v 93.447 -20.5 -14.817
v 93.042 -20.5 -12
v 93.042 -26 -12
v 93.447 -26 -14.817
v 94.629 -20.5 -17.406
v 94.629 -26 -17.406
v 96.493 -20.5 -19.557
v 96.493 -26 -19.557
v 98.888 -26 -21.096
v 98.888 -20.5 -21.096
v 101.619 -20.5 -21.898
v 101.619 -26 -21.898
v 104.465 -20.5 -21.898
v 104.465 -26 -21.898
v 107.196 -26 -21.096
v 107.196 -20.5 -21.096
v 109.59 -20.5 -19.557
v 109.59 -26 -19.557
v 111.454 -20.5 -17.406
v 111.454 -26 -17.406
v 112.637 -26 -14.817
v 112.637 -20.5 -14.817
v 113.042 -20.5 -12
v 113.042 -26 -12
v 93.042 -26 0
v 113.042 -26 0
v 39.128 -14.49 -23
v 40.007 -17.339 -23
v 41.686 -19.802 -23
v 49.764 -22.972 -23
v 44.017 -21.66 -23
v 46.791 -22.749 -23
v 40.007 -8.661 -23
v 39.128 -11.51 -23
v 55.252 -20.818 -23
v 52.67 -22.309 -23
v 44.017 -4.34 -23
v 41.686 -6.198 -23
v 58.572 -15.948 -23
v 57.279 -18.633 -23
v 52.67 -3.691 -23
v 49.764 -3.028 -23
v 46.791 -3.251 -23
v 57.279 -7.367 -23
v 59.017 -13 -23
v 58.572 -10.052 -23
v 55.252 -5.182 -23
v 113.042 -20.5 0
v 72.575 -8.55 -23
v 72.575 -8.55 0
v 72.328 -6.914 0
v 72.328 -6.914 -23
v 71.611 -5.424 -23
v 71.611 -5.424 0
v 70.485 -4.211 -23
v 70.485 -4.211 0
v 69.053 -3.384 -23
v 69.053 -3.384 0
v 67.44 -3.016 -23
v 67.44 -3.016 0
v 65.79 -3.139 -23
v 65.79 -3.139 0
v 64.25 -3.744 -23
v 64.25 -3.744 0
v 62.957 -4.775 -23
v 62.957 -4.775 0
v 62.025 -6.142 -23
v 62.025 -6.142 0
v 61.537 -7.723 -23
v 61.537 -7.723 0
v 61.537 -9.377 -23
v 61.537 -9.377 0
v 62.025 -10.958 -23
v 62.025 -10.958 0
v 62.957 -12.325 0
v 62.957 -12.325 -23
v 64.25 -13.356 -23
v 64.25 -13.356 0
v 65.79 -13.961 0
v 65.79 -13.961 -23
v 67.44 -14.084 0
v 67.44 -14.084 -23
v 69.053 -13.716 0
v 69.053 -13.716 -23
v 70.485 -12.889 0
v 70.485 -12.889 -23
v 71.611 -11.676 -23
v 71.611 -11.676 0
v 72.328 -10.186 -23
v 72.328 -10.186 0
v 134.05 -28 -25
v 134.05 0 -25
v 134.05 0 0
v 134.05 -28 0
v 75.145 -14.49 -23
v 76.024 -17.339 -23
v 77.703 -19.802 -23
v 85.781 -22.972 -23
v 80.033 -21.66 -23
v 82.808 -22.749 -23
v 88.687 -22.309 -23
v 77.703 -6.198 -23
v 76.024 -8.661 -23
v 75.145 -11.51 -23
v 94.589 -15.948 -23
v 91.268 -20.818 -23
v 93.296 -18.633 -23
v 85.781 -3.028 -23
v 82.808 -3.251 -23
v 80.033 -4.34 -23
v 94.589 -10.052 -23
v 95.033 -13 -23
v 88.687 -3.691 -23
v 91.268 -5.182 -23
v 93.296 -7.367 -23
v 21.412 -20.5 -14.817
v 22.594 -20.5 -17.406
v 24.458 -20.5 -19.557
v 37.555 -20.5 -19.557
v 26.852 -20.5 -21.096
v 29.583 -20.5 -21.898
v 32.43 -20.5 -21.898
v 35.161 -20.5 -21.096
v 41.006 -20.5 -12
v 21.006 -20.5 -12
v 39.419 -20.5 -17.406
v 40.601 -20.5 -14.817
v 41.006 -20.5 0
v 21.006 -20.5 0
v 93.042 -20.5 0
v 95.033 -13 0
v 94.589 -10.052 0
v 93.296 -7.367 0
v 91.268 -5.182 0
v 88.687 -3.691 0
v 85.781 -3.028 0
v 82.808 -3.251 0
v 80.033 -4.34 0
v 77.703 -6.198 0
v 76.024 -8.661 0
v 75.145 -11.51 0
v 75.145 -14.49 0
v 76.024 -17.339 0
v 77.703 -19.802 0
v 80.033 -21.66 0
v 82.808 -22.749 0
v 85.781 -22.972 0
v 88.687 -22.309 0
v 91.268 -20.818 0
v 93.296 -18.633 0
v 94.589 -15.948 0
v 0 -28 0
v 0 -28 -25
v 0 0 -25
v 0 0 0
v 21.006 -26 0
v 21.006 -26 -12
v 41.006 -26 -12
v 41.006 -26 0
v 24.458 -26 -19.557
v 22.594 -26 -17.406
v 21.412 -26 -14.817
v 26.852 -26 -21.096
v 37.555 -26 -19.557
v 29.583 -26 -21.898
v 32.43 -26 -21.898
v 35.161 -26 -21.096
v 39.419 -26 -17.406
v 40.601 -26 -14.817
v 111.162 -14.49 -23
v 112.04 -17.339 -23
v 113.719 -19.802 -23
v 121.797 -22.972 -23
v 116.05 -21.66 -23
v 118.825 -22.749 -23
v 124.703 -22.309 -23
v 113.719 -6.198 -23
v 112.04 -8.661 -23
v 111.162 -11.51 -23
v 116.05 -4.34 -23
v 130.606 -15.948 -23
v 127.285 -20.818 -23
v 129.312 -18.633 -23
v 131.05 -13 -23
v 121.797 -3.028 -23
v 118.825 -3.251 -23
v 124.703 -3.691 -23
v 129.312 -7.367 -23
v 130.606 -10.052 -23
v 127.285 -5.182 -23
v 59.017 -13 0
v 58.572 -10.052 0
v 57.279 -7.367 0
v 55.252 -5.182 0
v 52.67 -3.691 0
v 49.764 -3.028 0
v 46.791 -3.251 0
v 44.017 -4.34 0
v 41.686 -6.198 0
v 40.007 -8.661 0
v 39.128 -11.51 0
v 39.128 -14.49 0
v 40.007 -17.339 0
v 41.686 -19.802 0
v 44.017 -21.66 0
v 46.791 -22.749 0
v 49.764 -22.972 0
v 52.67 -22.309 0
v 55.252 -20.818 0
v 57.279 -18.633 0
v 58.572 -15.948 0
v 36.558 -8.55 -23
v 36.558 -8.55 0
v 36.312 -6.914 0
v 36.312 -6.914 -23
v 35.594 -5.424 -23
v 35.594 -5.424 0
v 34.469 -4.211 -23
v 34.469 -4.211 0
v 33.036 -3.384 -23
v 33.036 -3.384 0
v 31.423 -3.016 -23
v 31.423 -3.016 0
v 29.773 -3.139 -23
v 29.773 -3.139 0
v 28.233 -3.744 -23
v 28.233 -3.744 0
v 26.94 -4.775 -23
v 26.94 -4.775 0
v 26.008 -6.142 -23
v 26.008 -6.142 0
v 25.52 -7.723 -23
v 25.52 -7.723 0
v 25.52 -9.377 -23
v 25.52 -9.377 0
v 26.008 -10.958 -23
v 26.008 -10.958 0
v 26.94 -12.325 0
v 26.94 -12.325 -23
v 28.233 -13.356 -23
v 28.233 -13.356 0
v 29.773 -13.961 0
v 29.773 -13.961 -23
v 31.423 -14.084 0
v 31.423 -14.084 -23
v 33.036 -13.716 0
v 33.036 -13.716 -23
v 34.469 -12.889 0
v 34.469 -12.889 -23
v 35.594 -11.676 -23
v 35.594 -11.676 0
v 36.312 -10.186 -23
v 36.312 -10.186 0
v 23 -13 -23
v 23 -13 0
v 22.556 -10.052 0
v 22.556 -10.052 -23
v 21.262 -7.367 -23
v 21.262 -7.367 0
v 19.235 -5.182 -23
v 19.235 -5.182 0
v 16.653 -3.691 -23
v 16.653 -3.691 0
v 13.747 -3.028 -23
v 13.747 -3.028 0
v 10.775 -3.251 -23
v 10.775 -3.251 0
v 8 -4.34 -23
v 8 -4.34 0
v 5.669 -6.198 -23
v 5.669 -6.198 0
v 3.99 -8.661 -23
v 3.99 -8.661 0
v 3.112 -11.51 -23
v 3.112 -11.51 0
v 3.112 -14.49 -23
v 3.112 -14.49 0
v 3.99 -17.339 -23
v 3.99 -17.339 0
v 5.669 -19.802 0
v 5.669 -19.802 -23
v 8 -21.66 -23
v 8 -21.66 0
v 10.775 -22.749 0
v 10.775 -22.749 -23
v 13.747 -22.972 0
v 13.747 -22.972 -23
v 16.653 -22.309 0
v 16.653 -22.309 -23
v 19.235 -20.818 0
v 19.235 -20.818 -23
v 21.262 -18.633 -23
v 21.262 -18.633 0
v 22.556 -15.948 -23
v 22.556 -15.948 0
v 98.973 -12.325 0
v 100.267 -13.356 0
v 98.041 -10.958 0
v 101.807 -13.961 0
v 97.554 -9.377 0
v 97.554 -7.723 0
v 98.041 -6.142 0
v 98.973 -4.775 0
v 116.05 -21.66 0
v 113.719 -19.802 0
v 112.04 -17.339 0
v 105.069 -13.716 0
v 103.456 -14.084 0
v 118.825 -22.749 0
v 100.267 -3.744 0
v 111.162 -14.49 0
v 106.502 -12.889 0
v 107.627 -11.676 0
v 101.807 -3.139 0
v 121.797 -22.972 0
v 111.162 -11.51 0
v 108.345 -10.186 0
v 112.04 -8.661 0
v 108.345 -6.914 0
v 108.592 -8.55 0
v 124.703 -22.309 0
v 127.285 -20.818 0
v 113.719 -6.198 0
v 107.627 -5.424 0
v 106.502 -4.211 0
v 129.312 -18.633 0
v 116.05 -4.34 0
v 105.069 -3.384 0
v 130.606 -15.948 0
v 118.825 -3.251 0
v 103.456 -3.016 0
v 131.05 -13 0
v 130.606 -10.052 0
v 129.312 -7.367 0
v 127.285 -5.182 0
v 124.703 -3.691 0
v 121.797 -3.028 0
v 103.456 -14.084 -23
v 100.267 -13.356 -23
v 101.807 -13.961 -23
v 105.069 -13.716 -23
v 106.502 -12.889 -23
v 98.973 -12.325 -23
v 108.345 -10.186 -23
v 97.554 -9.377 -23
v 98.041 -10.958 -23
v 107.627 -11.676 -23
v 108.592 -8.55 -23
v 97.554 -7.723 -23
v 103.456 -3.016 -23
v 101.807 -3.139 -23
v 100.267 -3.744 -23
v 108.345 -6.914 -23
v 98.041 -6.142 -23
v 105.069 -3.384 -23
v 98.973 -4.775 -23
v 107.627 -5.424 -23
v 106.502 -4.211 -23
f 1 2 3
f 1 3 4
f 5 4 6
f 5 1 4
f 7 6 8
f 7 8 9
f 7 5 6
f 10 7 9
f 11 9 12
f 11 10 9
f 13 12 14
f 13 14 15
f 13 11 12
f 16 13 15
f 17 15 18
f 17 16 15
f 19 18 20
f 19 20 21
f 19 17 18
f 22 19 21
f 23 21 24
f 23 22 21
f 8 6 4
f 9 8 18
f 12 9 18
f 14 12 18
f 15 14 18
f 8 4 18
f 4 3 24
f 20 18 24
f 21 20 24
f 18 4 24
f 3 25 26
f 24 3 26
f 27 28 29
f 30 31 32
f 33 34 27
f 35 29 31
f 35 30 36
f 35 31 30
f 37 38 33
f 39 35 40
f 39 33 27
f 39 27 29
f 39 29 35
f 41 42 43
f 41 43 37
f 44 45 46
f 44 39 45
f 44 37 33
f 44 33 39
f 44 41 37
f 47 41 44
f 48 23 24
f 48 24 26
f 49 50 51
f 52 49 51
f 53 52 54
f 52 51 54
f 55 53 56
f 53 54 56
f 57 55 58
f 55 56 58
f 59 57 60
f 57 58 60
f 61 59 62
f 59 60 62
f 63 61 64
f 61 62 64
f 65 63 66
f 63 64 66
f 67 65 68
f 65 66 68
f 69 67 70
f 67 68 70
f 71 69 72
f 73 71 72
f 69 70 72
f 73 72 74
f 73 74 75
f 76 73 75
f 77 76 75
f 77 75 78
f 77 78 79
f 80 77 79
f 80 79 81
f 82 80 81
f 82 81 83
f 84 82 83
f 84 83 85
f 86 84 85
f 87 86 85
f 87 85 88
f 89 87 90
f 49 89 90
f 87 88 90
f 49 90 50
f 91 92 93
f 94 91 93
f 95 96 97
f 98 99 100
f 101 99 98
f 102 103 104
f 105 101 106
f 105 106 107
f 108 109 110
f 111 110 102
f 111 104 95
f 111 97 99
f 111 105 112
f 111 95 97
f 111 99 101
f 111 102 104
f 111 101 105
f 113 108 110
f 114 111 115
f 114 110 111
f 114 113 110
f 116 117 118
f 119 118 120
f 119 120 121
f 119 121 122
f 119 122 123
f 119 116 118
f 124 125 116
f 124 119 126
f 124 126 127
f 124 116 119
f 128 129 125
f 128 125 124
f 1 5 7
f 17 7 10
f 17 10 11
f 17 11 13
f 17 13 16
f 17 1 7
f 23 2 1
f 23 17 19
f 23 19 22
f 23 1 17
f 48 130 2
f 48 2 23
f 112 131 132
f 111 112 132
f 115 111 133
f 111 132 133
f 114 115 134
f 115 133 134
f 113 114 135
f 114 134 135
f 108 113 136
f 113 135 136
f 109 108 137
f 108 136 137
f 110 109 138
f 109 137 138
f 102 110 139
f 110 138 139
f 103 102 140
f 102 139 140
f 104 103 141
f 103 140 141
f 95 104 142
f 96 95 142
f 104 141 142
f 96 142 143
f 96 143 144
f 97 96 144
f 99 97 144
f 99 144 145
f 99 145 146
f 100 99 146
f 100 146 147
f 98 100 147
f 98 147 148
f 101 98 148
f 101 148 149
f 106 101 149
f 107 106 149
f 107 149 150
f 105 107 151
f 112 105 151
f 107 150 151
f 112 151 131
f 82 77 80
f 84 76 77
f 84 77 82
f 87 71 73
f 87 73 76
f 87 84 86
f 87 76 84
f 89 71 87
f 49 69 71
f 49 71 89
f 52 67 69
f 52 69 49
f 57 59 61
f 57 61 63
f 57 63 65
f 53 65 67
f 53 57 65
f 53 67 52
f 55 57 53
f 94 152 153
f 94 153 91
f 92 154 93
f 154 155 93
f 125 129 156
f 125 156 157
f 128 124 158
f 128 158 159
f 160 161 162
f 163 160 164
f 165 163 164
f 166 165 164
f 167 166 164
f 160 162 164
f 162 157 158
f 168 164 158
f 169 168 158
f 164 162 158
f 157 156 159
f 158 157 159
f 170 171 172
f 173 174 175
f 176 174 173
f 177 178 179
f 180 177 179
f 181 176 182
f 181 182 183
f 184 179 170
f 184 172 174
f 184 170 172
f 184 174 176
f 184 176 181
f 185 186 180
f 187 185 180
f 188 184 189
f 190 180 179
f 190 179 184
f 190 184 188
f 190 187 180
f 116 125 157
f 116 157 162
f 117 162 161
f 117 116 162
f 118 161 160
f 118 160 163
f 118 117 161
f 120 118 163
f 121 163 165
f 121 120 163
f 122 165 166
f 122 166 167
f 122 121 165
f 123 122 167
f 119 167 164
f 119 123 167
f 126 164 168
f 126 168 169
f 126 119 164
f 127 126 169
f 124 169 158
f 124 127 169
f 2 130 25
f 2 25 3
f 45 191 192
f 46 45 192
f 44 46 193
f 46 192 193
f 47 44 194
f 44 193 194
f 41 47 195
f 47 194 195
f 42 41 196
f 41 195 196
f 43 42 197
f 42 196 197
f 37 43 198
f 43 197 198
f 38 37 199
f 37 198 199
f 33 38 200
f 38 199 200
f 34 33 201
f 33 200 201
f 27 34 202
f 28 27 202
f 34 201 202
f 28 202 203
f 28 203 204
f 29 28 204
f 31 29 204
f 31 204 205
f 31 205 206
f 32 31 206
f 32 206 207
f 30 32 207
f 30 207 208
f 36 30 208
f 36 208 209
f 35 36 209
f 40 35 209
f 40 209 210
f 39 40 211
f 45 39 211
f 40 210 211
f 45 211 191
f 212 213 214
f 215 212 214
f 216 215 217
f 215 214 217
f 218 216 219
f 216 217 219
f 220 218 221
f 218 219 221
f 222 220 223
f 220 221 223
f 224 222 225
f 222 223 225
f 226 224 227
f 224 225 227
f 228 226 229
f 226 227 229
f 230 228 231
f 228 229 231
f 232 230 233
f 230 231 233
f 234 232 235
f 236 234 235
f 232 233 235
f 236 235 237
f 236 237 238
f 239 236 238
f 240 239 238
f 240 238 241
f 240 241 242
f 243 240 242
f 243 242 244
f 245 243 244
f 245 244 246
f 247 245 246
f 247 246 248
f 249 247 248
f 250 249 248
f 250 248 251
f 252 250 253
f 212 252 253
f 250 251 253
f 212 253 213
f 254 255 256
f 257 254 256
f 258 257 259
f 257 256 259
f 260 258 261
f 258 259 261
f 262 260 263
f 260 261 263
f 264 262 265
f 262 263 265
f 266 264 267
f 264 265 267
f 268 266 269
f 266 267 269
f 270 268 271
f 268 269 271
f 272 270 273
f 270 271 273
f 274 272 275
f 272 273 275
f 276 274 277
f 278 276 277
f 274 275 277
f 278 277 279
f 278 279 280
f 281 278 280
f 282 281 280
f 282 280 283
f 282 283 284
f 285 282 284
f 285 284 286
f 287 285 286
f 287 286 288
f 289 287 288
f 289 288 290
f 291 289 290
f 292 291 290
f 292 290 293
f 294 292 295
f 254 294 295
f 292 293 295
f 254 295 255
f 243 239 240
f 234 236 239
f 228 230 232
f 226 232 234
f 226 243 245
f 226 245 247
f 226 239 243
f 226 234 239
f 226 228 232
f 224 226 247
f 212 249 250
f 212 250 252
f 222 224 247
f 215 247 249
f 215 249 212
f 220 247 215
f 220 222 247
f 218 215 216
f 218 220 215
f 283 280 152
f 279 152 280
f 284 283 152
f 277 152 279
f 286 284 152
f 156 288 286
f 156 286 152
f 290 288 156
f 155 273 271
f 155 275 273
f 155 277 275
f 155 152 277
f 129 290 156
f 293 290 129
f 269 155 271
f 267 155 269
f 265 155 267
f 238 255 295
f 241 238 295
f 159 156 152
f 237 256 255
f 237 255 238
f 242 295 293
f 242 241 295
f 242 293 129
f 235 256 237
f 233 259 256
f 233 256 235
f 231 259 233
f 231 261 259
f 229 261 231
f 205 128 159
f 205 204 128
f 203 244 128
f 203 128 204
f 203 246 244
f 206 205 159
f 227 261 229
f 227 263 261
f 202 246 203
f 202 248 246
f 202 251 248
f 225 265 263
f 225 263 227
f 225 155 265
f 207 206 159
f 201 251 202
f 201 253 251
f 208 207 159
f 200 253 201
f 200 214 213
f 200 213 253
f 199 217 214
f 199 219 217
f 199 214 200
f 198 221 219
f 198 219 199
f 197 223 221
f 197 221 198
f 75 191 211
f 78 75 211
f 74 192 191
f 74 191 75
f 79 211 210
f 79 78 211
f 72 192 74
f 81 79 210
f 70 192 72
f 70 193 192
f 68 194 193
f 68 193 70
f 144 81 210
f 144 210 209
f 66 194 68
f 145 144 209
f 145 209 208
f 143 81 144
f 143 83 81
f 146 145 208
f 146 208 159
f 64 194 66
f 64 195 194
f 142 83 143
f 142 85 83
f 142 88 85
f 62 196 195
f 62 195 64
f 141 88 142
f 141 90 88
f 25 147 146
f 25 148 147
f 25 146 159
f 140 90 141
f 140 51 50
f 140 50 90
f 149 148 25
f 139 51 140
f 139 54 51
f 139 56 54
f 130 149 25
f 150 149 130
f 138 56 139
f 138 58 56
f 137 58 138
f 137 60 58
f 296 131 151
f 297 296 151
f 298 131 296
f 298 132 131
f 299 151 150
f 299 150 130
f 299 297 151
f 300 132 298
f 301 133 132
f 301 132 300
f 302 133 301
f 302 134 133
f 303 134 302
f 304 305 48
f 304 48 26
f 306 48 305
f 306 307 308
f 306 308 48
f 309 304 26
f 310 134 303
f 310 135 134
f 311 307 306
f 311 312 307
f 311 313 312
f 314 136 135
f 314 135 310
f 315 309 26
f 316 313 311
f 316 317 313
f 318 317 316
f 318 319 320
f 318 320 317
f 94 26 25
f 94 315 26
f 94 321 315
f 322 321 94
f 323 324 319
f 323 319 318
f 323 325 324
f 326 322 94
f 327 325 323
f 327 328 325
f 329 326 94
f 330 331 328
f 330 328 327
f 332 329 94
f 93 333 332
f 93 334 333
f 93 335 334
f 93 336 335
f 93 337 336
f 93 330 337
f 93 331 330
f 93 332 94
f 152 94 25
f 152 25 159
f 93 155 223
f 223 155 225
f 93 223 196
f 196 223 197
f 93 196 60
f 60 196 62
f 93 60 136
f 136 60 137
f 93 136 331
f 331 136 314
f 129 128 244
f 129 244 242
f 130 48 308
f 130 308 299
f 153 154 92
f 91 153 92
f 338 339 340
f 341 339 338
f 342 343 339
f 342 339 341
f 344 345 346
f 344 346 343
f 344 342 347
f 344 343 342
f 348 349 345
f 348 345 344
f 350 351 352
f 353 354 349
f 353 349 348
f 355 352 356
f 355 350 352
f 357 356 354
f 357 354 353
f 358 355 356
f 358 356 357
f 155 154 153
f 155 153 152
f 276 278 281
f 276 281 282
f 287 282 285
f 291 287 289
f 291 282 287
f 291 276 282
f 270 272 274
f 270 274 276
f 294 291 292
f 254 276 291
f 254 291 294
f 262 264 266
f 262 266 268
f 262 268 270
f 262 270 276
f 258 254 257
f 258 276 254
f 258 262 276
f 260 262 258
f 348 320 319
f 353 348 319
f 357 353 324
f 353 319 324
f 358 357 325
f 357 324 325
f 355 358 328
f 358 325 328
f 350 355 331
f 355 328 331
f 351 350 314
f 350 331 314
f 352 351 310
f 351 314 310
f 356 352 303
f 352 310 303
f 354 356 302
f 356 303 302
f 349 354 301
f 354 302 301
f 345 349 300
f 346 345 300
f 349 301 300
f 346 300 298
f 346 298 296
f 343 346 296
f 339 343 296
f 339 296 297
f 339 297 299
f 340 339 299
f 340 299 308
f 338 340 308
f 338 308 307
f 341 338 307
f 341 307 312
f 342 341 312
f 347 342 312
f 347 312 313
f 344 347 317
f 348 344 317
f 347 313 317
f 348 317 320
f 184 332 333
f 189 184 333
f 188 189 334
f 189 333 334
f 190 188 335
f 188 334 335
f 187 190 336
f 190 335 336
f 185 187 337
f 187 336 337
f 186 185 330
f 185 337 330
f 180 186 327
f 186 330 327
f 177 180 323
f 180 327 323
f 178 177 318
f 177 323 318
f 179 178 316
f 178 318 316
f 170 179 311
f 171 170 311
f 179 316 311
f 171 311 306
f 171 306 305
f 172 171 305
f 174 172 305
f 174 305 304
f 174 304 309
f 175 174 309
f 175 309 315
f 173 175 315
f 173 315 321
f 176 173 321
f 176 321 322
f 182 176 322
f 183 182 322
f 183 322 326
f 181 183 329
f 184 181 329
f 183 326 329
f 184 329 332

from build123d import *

# Parameters (mm, degrees)
F0_W     = 134.0499884313
F0_H     = 28
F0_W_2   = 20
F0_H_2   = 5
F0_R     = 10
F0_R_2   = 5.55
F1_DEPTH = 23
F3_START = 20.5
F3_DEPTH = 5.5
F4_W     = 134.0499884313
F4_H     = 2
F5_DEPTH = 28


with BuildPart() as f1:
    # F0 (on Top) → F1 (new body)
    with BuildSketch(Plane.XY):
        with Locations((67.0249942156, -14)):
            Rectangle(F0_W, F0_H)
        with Locations((31.0064340452, -23.5)):
            Rectangle(F0_W_2, F0_H_2, mode=Mode.SUBTRACT)
        with Locations((103.0416570261, -23.5)):
            Rectangle(F0_W_2, F0_H_2, mode=Mode.SUBTRACT)
        with Locations((13, -13)):
            Circle(F0_R, mode=Mode.SUBTRACT)
        with Locations((31.0083314052, -8.55)):
            Circle(F0_R_2, mode=Mode.SUBTRACT)
        with Locations((49.0166628104, -13)):
            Circle(F0_R, mode=Mode.SUBTRACT)
        with Locations((85.0333256209, -13)):
            Circle(F0_R, mode=Mode.SUBTRACT)
        with Locations((67.0249942156, -8.55)):
            Circle(F0_R_2, mode=Mode.SUBTRACT)
        with Locations((121.0499884313, -13)):
            Circle(F0_R, mode=Mode.SUBTRACT)
        with Locations((103.0416570261, -8.55)):
            Circle(F0_R_2, mode=Mode.SUBTRACT)
        with Locations((31.0064340452, -23.5)):
            Rectangle(F0_W_2, F0_H_2)
        with Locations((103.0416570261, -23.5)):
            Rectangle(F0_W_2, F0_H_2)
    extrude(amount=-F1_DEPTH)

    # F2 (on Front) → F3 (cut)
    with BuildSketch(Plane.XZ.offset(F3_START)):
        with BuildLine():
            Line((21.00643, -12), (41.00643, -12))
            ThreePointArc((41.00643, -12), (31.00643, -2), (21.00643, -12))
        make_face()
        with BuildLine():
            ThreePointArc((21.00643, -12), (31.00643, -22), (41.00643, -12))
            Line((41.00643, -12), (21.00643, -12))
        make_face()
        with BuildLine():
            ThreePointArc((21.00643, -12), (31.00643, -2), (41.00643, -12))
            Line((41.00643, -12), (41.00643, 6))
            Line((41.00643, 6), (21.00643, 6))
            Line((21.00643, 6), (21.00643, -12))
        make_face()
        with BuildLine():
            Line((93.04166, -12), (113.04166, -12))
            ThreePointArc((113.04166, -12), (103.04166, -2), (93.04166, -12))
        make_face()
        with BuildLine():
            ThreePointArc((93.04166, -12), (103.04166, -22), (113.04166, -12))
            Line((113.04166, -12), (93.04166, -12))
        make_face()
        with BuildLine():
            ThreePointArc((93.04166, -12), (103.04166, -2), (113.04166, -12))
            Line((113.04166, -12), (113.04166, 6))
            Line((113.04166, 6), (93.04166, 6))
            Line((93.04166, 6), (93.04166, -12))
        make_face()
    extrude(amount=F3_DEPTH, mode=Mode.SUBTRACT)

    # F4 (on Front) → F5 (join)
    with BuildSketch(Plane.XZ):
        with Locations((67.0249942156, -24)):
            Rectangle(F4_W, F4_H)
    extrude(amount=F5_DEPTH)


solid = f1.part
